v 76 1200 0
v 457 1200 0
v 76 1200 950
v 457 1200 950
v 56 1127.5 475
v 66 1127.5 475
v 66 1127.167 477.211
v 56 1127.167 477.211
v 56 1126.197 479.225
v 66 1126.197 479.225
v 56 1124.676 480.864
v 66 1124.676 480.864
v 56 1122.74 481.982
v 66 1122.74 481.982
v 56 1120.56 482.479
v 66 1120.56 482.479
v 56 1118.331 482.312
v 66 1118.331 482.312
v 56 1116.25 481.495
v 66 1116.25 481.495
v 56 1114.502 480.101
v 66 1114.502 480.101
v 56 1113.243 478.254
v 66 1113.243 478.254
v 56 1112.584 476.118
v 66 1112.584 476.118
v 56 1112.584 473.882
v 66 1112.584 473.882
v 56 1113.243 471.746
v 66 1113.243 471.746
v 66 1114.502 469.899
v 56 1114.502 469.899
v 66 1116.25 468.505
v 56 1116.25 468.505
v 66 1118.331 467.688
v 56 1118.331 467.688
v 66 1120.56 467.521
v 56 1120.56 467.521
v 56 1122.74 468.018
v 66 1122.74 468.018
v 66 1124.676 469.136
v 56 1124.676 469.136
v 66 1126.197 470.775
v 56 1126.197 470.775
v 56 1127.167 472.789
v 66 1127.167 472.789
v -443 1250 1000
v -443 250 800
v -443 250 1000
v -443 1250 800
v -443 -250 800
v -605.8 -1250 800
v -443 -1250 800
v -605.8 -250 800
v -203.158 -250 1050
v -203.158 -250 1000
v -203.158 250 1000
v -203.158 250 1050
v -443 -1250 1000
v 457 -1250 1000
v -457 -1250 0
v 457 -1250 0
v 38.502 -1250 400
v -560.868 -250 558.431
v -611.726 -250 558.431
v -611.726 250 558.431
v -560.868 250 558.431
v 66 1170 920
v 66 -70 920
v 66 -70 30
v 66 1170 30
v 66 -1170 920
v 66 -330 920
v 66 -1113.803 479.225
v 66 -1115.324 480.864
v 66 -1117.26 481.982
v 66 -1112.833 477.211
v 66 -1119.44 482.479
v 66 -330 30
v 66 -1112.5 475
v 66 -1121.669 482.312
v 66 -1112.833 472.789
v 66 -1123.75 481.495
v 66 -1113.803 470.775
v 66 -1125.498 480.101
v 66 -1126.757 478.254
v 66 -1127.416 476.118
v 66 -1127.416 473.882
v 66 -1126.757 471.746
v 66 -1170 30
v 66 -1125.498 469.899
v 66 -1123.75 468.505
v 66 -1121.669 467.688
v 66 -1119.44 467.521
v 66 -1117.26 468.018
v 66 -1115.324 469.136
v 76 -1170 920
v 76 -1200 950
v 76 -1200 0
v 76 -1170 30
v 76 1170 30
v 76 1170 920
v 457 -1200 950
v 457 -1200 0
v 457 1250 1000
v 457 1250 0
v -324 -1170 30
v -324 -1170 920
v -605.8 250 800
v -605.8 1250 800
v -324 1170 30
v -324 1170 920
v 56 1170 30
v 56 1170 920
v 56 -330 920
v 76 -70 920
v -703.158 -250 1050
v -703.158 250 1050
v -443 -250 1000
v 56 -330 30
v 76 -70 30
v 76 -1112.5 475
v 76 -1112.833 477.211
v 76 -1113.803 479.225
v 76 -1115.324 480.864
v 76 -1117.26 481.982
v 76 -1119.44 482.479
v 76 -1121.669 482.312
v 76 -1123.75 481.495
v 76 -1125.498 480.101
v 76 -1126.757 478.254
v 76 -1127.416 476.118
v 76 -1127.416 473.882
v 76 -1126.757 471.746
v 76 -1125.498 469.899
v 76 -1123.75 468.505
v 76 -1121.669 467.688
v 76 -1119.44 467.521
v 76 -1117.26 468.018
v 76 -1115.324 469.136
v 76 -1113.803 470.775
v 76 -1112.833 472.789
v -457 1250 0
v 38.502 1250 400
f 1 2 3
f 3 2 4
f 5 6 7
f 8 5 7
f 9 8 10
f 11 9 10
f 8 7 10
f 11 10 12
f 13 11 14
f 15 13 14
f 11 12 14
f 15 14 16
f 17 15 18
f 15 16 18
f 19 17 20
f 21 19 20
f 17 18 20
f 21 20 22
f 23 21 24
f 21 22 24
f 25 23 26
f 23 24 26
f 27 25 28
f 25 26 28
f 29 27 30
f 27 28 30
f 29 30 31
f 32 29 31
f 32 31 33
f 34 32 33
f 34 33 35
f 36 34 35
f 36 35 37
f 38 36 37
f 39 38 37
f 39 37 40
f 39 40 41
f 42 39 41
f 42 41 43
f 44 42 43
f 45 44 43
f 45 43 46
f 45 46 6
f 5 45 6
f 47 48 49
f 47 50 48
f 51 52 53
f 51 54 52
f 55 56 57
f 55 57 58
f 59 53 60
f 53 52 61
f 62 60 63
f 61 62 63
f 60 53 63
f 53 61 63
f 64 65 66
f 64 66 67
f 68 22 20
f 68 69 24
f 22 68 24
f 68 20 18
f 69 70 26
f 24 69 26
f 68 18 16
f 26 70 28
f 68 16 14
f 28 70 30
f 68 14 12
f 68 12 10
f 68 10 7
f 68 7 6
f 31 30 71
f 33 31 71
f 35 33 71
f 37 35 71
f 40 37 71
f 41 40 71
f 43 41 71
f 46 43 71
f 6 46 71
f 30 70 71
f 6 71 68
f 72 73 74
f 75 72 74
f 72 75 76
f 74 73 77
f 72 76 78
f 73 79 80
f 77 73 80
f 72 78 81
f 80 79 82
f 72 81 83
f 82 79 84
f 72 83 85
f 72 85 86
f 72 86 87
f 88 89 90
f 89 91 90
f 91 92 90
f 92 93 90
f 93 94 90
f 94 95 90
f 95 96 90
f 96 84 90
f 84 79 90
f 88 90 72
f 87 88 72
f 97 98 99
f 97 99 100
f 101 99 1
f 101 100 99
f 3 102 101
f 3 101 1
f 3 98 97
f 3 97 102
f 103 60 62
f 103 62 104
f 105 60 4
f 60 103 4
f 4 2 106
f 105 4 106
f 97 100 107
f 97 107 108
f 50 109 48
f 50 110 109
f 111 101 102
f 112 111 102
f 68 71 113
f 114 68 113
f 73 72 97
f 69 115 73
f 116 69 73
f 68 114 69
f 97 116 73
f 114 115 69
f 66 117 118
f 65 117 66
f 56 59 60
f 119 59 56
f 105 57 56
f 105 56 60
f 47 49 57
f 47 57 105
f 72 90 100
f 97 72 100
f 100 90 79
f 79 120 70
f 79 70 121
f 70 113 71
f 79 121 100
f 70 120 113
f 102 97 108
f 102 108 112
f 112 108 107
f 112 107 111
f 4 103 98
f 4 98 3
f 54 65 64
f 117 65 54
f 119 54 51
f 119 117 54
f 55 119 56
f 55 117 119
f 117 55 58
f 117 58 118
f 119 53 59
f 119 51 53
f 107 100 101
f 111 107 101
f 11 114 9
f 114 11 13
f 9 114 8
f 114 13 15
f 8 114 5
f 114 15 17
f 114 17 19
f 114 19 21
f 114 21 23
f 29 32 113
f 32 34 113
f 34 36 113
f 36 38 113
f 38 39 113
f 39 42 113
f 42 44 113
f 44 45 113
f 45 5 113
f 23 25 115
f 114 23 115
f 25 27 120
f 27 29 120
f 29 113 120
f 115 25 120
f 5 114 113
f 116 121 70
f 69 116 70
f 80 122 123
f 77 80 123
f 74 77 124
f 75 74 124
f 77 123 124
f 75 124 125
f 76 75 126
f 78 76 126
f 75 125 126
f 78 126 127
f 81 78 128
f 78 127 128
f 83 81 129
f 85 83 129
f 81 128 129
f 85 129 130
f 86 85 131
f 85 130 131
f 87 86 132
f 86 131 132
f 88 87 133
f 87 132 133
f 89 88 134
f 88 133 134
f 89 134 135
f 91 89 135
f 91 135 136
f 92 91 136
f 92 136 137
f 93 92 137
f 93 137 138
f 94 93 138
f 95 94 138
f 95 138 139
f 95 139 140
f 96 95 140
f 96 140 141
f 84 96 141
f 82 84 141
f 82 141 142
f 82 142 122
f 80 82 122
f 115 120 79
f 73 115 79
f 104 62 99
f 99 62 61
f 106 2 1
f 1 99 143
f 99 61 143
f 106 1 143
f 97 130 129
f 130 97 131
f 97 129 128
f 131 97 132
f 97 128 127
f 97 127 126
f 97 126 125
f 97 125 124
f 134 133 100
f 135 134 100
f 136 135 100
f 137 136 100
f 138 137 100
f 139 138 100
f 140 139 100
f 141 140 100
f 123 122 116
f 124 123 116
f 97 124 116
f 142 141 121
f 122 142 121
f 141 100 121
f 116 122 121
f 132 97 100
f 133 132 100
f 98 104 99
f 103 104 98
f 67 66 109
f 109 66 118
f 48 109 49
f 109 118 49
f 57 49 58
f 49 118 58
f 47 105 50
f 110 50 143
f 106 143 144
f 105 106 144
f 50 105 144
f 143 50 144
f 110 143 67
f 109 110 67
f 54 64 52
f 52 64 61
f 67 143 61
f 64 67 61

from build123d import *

# Parameters (mm, degrees)
F2_W           = 1100
F2_H           = 2500
F0_W           = 914
F0_H           = 2500
F4_W           = 2400
F4_H           = 950
F5_DEPTH       = 381
F6_W           = 2340
F6_H           = 890
F7_DEPTH       = 400
F9_DEPTH       = 890
F10_R          = 7.5
F11_DEPTH      = 50
F11_DEPTH_BACK = 60
F12_W          = 200
F12_H          = 200
F13_DEPTH      = 1250.0010001
F13_DEPTH_BACK = 1250.0010001
F15_DEPTH      = 250


with BuildPart() as f3:
    # F2 (on offset) → F3 section 0
    with BuildSketch(Plane.XY.offset(1000)):
        with Locations((-93, 0)):
            Rectangle(F2_W, F2_H)
    # F0 (on Top) → F3 section 1
    with BuildSketch(Plane.XY):
        Rectangle(F0_W, F0_H)
    loft()

    # F4 (on face) → F5 (cut)
    with BuildSketch(Plane.YZ.offset(457)):
        with Locations((0, 475)):
            Rectangle(F4_W, F4_H)
    extrude(amount=-F5_DEPTH, mode=Mode.SUBTRACT)

    # F6 (on face) → F7 (cut)
    with BuildSketch(Plane.YZ.offset(76)):
        with Locations((0, 475)):
            Rectangle(F6_W, F6_H)
    extrude(amount=-F7_DEPTH, mode=Mode.SUBTRACT)

    # F12 (on Front) → F13 (cut, two sides)
    with BuildSketch(Plane.XZ) as f13_sk:
        with Locations((-543, 900)):
            Rectangle(F12_W, F12_H)
    extrude(amount=-F13_DEPTH, mode=Mode.SUBTRACT)
    extrude(f13_sk.sketch, amount=F13_DEPTH_BACK, mode=Mode.SUBTRACT)

    # F14 (on Front) → F15 (join, symmetric)
    with BuildSketch(Plane.XZ):
        Polygon((-203.1575461461, 952.674343131), (-203.1575461461, 1050), (-703.1575461461, 1050), (-611.7256869163, 558.430864356), (-384.936348669, 558.430864356), (-384.936348669, 952.674343131), align=None)
    extrude(amount=F15_DEPTH, both=True)


with BuildPart() as f9:
    # F8 (on face) → F9 (new body, through all)
    with BuildSketch(Plane.XY.offset(30)):
        Polygon((66, -1170), (76, -1170), (76, -70), (66, -70), (66, -330), align=None)
        Polygon((56, -330), (66, -330), (66, -70), (66, 1170), (56, 1170), align=None)
    extrude(amount=F9_DEPTH)

    # F10 (on face) → F11 (cut, two sides)
    with BuildSketch(Plane.YZ.offset(76)) as f11_sk:
        with Locations((-1120, 475)):
            Circle(F10_R)
        with Locations((1120, 475)):
            Circle(F10_R)
    extrude(amount=-F11_DEPTH, mode=Mode.SUBTRACT)
    extrude(f11_sk.sketch, amount=F11_DEPTH_BACK, mode=Mode.SUBTRACT)


solid = Compound([f3.part, f9.part])
